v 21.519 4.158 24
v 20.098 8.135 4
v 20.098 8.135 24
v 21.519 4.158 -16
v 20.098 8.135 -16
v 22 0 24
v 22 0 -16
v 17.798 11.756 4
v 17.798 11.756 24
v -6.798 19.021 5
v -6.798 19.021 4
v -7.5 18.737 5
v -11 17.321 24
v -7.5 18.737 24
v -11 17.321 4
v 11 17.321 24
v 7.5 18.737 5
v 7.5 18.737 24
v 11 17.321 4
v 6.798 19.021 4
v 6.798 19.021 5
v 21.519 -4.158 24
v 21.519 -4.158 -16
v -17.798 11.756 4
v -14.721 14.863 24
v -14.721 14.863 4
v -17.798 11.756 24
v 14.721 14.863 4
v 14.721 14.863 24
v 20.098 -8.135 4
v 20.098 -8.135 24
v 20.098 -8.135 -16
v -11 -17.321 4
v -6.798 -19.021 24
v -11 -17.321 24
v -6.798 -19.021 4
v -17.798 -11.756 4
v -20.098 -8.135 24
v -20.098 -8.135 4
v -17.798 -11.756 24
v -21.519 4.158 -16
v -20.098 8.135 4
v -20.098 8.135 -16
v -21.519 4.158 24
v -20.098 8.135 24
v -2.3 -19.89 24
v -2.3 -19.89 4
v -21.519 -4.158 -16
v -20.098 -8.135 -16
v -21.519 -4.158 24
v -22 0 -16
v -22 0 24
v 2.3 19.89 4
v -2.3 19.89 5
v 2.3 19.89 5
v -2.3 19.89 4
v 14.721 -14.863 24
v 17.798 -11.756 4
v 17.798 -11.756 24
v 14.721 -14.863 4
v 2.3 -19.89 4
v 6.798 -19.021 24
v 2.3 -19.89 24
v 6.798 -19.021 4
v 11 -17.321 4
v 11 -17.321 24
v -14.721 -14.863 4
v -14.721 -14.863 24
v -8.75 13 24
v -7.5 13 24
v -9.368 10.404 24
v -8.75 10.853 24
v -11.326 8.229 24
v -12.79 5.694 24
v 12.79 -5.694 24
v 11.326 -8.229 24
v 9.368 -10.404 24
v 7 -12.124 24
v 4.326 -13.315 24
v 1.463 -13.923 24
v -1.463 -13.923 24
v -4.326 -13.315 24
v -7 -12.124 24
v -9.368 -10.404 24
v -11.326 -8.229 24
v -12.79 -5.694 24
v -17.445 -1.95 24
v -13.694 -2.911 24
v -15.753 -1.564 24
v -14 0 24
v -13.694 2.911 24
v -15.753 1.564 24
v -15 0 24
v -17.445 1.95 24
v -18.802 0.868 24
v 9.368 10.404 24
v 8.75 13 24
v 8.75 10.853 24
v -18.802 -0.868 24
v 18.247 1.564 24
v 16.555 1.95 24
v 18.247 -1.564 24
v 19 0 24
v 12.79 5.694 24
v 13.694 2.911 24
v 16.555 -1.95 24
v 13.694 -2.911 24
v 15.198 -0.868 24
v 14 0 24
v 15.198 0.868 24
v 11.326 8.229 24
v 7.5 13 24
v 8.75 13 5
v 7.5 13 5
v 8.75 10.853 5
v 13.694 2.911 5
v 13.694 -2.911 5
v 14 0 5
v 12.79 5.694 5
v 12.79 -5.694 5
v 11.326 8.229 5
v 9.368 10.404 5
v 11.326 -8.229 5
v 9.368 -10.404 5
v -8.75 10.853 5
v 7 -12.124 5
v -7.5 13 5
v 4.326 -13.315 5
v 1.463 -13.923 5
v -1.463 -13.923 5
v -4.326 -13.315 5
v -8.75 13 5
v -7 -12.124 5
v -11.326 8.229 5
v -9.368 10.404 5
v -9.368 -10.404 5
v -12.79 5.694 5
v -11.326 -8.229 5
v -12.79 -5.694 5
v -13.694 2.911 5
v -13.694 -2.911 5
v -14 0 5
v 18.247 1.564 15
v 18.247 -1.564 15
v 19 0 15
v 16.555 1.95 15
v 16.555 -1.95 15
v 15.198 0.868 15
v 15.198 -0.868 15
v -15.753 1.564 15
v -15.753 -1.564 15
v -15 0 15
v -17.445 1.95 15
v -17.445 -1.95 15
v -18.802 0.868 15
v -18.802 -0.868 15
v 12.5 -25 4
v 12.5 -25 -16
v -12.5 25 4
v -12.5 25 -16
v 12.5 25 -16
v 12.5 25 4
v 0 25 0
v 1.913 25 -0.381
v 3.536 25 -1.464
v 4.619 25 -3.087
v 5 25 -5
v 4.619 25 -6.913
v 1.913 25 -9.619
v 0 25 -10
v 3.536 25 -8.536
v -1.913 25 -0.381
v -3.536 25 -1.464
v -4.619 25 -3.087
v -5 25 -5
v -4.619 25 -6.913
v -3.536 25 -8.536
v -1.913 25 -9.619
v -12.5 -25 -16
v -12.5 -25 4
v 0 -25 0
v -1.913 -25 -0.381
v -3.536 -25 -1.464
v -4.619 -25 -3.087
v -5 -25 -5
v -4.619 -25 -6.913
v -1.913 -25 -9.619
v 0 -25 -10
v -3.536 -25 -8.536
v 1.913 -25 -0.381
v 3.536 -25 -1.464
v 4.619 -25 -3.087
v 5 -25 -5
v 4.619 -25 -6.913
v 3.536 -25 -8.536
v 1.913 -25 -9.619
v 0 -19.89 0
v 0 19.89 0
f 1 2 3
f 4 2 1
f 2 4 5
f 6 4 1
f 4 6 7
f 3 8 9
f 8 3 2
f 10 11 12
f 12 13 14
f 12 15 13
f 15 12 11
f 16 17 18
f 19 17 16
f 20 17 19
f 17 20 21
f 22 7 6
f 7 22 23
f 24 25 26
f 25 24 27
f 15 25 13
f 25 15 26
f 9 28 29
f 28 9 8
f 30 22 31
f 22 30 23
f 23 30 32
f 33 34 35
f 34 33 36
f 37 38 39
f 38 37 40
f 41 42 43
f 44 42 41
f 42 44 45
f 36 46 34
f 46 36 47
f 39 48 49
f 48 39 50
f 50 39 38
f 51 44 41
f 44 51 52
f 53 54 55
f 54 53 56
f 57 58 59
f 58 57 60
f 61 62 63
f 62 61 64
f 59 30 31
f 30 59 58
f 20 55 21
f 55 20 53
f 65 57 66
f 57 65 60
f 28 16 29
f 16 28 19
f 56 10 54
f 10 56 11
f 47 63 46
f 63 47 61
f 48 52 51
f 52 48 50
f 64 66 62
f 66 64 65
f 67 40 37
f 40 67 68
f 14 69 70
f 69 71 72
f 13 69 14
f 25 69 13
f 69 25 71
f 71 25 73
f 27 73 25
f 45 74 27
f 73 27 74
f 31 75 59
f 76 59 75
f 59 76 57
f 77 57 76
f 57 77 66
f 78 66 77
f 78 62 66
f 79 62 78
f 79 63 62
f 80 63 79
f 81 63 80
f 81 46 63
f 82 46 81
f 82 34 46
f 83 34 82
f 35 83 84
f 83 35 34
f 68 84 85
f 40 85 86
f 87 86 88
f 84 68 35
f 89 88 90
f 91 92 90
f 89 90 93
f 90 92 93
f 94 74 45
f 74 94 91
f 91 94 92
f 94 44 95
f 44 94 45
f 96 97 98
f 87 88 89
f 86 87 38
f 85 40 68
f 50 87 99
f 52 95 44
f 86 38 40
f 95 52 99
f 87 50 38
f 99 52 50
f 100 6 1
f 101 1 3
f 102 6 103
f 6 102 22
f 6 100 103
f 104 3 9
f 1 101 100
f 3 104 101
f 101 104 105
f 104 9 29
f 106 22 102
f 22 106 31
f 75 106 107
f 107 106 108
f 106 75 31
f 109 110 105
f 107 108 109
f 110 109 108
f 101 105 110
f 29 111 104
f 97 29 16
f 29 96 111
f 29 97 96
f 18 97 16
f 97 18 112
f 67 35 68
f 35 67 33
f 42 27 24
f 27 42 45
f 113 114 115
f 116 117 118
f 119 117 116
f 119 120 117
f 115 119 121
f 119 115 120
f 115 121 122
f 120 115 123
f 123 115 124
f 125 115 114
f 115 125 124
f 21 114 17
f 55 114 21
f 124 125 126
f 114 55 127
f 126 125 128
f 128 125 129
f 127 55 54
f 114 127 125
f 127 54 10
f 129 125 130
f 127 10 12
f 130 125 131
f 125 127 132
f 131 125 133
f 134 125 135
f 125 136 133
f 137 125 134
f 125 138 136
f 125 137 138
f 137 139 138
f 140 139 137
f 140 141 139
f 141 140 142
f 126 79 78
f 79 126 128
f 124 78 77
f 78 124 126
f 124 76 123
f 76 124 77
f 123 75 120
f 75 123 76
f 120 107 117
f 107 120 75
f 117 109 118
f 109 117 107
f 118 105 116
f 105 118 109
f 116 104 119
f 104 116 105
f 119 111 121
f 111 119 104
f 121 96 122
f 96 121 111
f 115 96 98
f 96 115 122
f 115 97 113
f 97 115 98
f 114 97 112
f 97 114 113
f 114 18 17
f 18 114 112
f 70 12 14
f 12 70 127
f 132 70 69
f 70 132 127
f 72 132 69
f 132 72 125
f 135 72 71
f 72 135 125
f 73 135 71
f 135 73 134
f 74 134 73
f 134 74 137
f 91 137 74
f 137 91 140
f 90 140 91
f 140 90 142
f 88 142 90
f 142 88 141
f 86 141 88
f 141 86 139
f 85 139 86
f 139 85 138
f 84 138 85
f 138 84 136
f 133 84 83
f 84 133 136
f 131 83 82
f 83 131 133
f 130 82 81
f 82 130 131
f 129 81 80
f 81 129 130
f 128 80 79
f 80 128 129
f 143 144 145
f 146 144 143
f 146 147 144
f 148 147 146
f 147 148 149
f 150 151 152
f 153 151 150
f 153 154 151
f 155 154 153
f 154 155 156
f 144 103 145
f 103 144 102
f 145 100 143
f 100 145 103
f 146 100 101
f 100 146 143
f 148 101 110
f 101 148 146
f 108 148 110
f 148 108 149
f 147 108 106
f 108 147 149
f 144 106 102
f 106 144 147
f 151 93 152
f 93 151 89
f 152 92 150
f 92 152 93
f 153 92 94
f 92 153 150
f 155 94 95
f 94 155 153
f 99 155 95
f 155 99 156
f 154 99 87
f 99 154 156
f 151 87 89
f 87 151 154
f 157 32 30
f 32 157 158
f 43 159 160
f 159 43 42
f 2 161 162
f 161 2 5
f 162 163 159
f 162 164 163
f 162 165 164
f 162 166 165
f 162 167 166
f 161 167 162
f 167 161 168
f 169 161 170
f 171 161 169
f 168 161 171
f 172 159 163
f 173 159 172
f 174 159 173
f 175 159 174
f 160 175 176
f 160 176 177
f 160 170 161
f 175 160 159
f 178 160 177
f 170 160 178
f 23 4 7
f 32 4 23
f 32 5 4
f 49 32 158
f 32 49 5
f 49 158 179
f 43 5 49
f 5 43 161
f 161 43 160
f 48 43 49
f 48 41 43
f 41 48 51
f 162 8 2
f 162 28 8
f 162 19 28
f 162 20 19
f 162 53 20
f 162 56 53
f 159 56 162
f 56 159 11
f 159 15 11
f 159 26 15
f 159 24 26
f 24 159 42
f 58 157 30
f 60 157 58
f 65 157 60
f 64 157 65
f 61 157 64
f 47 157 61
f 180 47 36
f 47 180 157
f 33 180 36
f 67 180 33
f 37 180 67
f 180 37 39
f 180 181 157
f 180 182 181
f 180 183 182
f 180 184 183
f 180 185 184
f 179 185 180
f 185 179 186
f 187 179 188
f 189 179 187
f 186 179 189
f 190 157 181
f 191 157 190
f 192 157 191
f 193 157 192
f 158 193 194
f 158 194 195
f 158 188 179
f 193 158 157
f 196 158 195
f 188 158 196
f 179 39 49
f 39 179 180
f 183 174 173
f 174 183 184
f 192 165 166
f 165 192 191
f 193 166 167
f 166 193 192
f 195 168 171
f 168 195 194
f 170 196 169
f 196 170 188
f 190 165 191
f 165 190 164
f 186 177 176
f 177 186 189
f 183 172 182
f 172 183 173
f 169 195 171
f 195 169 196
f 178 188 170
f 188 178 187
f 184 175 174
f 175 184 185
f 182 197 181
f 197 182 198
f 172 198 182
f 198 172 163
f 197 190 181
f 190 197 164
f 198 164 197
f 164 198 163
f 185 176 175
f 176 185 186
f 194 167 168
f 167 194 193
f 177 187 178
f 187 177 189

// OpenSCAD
difference(){
	scale([1.1,1])cylinder(24, 20,20);

	color("blue")translate([0,0,5])linear_extrude(height = 19.3, center = false){
		circle(14);
		translate([0,8,0])square([17.5,10],true);
		translate([0,15,0]) square([15,10],true);
	}

	color("green")translate([0,0,15])linear_extrude(height = 10, center = false){
		translate([17,0,0])circle(2);
		translate([-17,0,0])circle(2);
	}
}

difference(){
translate([0,0,-16])linear_extrude(height = 20, center = false)hull(){
	scale([1.1,1])circle(20);
	translate([0,20,0])square([25,10],true);
	translate([0,-20,0])square([25,10],true);
}

rotate([90,0,0])translate([0,-5,0])cylinder(60,5,5,true);
}
